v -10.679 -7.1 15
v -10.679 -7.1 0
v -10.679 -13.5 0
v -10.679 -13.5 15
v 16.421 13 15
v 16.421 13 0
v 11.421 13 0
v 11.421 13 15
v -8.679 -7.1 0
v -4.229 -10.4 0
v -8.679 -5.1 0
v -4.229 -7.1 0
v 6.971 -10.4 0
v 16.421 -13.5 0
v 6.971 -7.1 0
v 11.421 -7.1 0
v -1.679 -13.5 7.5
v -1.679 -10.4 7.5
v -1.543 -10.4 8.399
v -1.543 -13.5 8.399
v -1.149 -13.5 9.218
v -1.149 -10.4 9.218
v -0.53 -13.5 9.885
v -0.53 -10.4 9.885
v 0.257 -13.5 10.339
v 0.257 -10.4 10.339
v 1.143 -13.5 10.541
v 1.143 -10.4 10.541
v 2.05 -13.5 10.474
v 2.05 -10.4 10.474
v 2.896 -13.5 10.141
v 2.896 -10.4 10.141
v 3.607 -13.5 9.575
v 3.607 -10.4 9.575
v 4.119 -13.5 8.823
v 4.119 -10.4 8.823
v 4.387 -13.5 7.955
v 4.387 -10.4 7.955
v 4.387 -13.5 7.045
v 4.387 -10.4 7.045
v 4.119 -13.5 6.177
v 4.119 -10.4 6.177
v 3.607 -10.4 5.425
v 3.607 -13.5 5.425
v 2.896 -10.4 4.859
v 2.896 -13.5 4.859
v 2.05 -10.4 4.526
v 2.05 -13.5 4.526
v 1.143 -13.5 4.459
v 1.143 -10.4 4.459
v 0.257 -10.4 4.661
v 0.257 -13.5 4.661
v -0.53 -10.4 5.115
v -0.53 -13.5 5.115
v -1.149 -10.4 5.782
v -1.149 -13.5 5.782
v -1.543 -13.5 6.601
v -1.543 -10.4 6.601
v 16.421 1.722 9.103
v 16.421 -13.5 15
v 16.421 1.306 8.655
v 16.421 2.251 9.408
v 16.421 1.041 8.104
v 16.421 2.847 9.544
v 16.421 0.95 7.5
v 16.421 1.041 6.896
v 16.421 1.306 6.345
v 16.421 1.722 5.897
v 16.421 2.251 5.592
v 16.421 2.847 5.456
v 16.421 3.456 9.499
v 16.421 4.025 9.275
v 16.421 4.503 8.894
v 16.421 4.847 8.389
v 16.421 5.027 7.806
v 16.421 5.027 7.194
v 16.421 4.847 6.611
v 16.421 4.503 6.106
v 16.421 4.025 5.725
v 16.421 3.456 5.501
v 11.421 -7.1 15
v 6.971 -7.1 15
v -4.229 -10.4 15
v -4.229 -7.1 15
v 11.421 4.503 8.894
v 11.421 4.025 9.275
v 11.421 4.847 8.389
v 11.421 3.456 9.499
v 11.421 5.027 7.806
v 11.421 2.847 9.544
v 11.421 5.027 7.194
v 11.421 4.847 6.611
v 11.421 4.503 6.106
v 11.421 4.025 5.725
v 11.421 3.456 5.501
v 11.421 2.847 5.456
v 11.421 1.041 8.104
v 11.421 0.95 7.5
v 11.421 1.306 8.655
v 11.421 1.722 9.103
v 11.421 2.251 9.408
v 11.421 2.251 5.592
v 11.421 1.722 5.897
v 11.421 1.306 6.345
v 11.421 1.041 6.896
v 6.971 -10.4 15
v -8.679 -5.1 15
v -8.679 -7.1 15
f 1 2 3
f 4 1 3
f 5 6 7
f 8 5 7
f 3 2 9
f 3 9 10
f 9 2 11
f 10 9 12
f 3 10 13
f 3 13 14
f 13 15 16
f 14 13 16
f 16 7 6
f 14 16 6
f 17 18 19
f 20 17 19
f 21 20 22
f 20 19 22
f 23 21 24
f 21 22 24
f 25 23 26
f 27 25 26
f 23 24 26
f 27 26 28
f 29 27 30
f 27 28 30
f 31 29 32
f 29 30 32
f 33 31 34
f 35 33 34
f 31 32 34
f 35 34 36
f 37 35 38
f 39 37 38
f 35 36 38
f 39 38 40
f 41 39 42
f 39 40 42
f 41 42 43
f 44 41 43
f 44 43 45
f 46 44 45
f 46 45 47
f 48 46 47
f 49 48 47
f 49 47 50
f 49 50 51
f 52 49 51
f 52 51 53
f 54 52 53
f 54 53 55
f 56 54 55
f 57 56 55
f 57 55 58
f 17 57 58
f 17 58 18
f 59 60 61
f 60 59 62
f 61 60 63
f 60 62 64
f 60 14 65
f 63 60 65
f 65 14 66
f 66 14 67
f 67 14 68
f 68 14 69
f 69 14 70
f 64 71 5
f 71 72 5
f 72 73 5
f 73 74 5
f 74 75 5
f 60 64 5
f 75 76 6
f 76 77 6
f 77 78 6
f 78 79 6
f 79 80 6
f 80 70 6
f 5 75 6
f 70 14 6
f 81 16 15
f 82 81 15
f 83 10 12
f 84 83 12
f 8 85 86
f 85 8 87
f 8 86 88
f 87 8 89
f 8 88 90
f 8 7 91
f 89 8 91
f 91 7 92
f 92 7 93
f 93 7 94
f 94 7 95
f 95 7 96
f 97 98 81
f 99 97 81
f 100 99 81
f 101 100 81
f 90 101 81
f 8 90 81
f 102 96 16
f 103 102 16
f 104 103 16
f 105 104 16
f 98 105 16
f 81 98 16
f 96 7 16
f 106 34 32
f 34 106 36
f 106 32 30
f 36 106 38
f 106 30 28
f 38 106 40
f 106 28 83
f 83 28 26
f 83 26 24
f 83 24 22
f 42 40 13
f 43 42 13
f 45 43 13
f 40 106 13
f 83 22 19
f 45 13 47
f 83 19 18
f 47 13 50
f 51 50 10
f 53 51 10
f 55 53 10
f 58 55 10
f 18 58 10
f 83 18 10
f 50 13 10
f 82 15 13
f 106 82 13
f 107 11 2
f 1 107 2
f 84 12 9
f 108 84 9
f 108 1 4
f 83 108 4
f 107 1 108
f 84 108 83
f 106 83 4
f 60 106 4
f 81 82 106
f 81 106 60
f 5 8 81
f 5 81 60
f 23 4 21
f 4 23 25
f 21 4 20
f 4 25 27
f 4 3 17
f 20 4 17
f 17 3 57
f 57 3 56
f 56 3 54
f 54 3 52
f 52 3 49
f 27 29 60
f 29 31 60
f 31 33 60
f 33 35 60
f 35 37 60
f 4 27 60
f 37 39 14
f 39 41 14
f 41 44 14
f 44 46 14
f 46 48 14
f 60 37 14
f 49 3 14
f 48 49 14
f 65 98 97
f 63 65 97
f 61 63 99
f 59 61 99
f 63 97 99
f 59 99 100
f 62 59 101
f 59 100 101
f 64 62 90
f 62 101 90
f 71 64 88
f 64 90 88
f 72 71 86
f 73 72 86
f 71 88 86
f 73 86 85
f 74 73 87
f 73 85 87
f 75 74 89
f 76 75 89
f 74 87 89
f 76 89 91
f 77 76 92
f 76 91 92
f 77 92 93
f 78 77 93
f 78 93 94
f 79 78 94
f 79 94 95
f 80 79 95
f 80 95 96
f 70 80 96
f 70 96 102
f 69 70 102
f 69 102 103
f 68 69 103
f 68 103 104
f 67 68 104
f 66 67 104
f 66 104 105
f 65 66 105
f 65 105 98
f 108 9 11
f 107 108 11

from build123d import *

# Parameters (mm, degrees)
F1_DEPTH = 15
F4_D     = 4.1
F4_DEPTH = 7
F5_D     = 6.1
F5_DEPTH = 7


with BuildPart() as f1:
    # F0 (on Top) → F1 (new body)
    with BuildSketch(Plane.XY):
        Polygon((-8.678603, -7.1), (-8.678603, -5.1), (-10.678603, -7.1), (-10.678603, -13.5), (16.421397, -13.5), (16.421397, 13), (11.421397, 13), (11.421397, -7.1), (6.971397, -7.1), (6.971397, -10.4), (-4.228603, -10.4), (-4.228603, -7.1), align=None)
    extrude(amount=F1_DEPTH)

    # F4
    with Locations(Plane.YZ.offset(16.421397)):
        with Locations((3, 7.5)):
            Hole(F4_D / 2, depth=F4_DEPTH)

    # F5
    with Locations(Plane.XZ.offset(13.5)):
        with Locations((1.371397, 7.5)):
            Hole(F5_D / 2, depth=F5_DEPTH)


solid = f1.part
